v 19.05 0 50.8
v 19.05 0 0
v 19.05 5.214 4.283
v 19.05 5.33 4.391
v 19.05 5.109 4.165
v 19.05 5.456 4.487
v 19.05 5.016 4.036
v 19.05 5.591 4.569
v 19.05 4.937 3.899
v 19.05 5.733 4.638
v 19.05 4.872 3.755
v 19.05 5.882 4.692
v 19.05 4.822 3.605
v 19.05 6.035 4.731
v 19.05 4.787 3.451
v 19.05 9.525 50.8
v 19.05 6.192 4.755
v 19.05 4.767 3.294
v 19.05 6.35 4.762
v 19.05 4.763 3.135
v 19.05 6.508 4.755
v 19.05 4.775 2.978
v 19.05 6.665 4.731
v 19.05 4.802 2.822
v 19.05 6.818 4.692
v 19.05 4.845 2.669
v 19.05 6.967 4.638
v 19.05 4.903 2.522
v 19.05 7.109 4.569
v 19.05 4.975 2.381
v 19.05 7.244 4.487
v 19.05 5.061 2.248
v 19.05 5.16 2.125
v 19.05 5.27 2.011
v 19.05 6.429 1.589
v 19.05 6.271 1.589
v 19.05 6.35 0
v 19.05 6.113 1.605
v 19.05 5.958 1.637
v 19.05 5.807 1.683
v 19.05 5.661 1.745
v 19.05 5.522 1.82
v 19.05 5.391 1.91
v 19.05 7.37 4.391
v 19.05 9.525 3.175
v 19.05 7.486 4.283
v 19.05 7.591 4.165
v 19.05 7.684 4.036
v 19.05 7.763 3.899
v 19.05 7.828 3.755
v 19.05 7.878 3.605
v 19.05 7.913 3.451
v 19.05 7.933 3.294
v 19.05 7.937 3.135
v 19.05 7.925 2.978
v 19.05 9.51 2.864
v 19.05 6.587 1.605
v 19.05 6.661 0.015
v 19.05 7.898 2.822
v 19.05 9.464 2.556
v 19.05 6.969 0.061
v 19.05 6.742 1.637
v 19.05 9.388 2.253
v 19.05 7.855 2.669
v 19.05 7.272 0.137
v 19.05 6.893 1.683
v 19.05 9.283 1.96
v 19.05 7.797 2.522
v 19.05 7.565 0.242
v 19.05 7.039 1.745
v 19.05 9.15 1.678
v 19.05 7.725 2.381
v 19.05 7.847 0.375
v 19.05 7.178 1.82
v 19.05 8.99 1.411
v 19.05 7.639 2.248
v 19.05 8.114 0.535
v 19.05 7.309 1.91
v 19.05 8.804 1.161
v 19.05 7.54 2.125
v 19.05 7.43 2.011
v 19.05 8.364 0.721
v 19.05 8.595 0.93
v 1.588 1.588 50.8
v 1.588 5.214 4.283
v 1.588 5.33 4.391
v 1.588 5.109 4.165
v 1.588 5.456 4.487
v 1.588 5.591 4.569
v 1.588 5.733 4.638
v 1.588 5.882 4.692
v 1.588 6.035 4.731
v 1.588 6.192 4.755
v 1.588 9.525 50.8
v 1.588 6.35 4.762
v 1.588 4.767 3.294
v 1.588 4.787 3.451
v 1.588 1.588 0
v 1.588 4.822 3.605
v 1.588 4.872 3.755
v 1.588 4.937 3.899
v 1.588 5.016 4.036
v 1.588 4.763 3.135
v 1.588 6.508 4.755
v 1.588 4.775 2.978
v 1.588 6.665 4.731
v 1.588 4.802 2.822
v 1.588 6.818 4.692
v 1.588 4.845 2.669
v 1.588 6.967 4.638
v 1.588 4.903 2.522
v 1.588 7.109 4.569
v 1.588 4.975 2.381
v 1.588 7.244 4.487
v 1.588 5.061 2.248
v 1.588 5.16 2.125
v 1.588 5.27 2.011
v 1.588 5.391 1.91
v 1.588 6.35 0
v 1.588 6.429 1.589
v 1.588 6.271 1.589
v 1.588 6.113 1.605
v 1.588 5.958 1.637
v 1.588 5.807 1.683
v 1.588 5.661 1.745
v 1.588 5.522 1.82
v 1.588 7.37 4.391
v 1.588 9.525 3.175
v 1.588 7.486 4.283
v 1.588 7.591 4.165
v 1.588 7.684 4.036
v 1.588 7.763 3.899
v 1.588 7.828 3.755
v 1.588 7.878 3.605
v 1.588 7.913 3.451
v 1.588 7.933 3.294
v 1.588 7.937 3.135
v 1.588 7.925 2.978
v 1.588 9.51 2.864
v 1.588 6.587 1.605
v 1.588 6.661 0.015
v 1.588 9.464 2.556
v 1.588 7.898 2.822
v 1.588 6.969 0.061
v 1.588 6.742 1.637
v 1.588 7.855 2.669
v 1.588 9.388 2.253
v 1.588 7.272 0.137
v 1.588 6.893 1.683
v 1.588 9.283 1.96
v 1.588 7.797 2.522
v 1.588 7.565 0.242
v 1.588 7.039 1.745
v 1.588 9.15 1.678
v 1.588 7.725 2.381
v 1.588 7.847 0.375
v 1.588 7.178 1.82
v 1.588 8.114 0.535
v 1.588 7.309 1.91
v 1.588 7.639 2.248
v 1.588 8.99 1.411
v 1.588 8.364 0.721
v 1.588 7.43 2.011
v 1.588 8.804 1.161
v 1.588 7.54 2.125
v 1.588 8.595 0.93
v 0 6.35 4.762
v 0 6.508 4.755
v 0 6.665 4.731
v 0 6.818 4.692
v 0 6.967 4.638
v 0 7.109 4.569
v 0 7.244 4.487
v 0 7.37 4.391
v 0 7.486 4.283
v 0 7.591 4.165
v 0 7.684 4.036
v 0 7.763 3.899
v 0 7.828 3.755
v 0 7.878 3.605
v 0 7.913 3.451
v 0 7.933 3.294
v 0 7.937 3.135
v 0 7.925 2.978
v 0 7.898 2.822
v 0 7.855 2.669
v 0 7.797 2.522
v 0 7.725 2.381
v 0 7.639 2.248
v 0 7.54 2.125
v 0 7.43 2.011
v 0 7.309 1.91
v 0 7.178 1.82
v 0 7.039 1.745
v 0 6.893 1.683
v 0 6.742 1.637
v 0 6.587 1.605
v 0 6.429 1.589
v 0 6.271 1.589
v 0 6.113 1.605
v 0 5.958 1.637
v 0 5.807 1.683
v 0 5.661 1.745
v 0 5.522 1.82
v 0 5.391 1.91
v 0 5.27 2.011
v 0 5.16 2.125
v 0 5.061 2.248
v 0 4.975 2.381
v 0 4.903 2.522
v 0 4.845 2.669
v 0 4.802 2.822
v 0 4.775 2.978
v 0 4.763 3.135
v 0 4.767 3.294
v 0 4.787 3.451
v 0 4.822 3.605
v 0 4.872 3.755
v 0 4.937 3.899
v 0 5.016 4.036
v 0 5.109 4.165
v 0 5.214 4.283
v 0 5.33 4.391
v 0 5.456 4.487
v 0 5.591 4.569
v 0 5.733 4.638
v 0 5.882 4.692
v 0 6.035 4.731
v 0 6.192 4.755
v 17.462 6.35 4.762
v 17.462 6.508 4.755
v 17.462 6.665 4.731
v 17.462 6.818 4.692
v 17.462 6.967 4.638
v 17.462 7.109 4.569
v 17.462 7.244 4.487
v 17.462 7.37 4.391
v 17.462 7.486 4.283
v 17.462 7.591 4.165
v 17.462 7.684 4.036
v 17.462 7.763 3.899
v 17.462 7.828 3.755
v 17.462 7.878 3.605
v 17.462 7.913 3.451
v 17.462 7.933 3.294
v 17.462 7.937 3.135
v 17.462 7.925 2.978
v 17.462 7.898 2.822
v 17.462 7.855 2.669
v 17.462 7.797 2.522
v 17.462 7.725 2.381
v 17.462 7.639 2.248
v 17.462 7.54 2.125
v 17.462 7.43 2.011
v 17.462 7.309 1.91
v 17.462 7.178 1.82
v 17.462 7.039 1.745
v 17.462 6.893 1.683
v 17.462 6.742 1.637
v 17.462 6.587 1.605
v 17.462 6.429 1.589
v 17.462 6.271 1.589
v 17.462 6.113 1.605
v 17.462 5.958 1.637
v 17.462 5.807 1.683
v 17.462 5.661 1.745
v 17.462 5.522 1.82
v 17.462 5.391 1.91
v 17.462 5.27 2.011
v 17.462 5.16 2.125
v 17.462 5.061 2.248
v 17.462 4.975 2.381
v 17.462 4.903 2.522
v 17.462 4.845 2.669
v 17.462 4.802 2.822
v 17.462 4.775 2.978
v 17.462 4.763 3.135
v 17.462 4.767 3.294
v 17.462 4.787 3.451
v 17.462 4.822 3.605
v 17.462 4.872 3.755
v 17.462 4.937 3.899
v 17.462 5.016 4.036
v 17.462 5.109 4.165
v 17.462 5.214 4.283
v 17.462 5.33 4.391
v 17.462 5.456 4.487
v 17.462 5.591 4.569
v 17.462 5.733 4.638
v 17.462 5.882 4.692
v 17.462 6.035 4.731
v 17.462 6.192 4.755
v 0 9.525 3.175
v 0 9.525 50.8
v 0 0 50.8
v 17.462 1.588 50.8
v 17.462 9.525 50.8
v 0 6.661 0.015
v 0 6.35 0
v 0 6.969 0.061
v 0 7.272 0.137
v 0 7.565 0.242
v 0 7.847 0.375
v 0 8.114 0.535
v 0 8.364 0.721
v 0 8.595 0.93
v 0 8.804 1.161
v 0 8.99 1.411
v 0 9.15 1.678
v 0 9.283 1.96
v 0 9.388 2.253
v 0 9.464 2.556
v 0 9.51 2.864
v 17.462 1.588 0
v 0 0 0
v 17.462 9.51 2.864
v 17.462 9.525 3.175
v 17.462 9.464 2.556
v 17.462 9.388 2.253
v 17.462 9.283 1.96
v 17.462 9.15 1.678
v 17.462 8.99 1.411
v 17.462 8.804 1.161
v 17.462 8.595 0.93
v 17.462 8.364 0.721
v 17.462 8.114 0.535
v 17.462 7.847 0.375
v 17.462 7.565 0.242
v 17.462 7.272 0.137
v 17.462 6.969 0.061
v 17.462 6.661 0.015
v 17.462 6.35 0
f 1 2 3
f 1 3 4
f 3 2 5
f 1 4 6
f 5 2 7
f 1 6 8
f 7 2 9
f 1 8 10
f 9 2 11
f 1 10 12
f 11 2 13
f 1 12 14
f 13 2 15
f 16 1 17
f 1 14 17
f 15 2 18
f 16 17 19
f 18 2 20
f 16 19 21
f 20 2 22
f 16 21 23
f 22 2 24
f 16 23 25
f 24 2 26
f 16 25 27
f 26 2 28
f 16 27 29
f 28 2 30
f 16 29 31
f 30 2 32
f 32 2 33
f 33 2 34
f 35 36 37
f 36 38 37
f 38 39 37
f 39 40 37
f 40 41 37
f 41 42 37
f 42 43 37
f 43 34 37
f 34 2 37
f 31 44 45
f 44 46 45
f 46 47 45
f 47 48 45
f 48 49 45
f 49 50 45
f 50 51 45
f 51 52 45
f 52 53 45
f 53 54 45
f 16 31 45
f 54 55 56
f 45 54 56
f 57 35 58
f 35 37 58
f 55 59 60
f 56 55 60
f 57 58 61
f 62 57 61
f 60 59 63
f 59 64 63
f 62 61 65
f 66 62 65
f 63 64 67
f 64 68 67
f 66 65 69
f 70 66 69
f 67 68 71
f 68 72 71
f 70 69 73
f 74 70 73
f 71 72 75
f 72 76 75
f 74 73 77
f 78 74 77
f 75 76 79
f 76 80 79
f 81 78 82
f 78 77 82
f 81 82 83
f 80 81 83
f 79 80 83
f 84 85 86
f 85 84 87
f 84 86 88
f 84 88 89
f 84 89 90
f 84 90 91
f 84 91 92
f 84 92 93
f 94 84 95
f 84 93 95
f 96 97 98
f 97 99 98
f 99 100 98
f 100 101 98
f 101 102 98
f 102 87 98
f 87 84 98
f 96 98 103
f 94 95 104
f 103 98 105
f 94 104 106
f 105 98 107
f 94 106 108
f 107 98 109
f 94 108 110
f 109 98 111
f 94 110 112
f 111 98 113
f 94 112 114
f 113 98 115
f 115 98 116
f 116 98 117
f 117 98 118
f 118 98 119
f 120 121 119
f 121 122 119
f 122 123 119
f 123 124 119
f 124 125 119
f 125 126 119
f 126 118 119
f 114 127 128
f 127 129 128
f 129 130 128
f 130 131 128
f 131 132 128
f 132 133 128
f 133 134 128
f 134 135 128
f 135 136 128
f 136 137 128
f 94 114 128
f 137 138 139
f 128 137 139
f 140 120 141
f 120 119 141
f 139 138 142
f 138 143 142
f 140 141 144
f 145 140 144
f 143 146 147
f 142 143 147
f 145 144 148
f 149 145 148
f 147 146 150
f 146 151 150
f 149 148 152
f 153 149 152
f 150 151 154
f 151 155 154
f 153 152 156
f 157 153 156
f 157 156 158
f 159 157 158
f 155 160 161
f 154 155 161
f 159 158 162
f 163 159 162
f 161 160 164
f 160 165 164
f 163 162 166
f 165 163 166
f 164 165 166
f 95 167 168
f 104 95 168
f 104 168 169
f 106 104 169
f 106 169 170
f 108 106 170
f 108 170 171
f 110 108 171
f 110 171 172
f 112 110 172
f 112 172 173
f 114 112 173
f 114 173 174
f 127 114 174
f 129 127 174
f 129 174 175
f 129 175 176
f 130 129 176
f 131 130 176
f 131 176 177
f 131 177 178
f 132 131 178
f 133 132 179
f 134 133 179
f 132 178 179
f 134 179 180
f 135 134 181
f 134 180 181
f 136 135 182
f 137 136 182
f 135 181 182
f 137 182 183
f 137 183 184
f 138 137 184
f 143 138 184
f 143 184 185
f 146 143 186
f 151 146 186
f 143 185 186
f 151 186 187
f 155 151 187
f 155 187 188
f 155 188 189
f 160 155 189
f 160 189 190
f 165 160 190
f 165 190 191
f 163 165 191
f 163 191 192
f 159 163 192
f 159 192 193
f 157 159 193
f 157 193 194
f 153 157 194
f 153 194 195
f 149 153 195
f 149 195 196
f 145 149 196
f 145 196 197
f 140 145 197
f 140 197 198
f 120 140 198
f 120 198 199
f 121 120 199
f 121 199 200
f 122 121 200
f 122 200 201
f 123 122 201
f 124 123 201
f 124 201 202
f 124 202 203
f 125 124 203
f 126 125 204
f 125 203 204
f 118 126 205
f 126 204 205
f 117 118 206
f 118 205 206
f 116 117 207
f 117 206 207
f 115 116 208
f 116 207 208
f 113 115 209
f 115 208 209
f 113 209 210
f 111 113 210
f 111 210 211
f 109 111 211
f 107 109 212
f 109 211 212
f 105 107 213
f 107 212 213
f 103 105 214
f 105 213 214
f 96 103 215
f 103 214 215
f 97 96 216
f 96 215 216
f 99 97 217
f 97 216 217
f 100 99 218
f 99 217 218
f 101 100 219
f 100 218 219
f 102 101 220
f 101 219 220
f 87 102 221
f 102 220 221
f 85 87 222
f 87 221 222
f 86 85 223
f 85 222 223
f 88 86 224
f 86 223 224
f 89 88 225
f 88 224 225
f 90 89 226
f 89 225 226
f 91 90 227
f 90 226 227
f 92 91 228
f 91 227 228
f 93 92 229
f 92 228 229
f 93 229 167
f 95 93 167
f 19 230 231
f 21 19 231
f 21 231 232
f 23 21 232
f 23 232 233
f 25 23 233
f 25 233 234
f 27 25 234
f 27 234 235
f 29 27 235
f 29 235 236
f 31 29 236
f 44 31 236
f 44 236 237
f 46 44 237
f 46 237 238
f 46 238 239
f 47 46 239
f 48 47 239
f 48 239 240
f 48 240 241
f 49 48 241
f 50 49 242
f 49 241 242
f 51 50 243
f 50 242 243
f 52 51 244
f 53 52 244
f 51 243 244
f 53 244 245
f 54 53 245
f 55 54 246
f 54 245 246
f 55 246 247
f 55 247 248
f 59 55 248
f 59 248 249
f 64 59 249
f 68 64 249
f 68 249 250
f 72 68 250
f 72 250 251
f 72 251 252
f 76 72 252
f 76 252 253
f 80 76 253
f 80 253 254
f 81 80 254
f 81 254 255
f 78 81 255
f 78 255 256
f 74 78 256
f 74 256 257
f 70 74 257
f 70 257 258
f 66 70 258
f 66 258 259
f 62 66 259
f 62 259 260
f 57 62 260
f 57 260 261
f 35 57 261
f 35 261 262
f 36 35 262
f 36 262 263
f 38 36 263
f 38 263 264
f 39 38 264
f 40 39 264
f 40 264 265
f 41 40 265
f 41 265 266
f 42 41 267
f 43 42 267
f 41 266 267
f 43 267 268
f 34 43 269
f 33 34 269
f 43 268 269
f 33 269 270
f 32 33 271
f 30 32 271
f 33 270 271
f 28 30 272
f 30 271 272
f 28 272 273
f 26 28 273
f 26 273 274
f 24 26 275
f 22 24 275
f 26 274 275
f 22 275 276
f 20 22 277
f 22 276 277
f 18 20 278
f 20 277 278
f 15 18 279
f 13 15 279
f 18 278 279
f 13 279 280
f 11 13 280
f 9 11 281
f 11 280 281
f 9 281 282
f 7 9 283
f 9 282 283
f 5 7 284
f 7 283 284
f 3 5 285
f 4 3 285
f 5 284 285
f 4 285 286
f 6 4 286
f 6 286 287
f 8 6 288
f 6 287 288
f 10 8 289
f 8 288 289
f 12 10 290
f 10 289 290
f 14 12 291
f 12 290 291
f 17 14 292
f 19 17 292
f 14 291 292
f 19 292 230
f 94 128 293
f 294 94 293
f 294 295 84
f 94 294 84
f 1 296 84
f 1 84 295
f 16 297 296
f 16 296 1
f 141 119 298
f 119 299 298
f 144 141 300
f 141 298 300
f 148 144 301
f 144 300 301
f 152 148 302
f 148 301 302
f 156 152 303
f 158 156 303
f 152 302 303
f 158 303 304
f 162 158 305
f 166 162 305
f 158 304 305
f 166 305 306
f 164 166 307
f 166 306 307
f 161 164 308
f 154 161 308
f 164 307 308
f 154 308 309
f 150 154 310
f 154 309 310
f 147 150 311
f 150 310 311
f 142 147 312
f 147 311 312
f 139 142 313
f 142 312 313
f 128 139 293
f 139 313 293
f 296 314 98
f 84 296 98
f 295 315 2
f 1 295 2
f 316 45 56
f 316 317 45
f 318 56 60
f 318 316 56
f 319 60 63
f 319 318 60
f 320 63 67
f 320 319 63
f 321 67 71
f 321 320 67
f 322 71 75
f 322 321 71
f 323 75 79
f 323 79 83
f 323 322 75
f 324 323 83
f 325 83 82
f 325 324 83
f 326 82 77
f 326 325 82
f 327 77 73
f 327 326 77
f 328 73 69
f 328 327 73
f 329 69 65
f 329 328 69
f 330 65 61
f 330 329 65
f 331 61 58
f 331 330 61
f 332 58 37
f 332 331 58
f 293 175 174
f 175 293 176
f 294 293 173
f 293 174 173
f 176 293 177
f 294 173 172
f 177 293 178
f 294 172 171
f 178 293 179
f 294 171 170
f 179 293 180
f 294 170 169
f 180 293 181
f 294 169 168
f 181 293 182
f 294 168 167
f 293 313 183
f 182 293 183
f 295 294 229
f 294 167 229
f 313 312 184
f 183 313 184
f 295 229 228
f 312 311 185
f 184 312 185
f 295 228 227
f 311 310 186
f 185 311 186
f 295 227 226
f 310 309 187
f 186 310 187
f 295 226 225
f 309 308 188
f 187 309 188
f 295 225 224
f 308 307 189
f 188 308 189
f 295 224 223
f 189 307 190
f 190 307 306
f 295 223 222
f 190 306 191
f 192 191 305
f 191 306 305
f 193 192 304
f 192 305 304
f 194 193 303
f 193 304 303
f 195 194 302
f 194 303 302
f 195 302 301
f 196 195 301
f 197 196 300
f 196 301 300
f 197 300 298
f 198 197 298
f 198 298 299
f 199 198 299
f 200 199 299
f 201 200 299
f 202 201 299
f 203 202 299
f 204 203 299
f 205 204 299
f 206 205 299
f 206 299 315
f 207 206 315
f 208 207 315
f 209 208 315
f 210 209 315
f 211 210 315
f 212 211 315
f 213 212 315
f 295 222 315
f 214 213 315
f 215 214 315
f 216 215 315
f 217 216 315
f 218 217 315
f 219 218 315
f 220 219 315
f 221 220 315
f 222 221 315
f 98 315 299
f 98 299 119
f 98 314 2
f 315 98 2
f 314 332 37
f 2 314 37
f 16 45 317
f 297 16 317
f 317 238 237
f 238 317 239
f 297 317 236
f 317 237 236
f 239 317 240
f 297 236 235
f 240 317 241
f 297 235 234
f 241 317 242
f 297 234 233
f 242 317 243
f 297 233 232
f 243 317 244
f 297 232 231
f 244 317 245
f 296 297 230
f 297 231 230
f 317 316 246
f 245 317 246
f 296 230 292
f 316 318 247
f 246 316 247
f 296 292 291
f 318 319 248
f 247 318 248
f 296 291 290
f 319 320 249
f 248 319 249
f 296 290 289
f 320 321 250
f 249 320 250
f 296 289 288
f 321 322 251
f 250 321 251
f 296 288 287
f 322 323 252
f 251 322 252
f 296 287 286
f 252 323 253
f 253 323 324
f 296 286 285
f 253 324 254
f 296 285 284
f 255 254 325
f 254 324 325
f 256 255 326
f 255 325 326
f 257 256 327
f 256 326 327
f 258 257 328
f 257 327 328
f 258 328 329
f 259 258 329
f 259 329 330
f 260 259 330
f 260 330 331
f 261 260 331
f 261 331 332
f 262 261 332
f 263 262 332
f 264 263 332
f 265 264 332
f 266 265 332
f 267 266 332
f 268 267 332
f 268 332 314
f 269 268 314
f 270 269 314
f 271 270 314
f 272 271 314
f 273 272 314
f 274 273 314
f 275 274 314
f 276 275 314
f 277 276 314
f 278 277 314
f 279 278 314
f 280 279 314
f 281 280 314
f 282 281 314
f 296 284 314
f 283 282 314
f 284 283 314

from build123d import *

# Parameters (mm, degrees)
BOSS_EXTRUDE1_DEPTH          = 50.8
F_1_8_0_125_DIAMETER_HOLE1_D = 3.175
FILLET2_R                    = 3.175


with BuildPart() as part:
    # Sketch1 → Boss-Extrude1 (new body)
    with BuildSketch(Plane.XY):
        Polygon((17.4625, 9.525), (17.4625, 1.5875), (1.5875, 1.5875), (1.5875, 9.525), (0, 9.525), (0, 0), (19.05, 0), (19.05, 9.525), align=None)
    extrude(amount=BOSS_EXTRUDE1_DEPTH)

    # 1/8 (0.125) Diameter Hole1 (through all)
    with Locations(Plane(origin=(19.05, 0, 0), x_dir=(0, 0, -1), z_dir=(1, 0, 0))):
        with Locations((-3.175, 6.35)):
            Hole(F_1_8_0_125_DIAMETER_HOLE1_D / 2)

    # Fillet2
    fillet2_edges = [part.edges().sort_by_distance(p)[0] for p in [
        (0.79375, 9.525, 0),
        (18.25625, 9.525, 0),
    ]]
    fillet(fillet2_edges, radius=FILLET2_R)


solid = part.part
